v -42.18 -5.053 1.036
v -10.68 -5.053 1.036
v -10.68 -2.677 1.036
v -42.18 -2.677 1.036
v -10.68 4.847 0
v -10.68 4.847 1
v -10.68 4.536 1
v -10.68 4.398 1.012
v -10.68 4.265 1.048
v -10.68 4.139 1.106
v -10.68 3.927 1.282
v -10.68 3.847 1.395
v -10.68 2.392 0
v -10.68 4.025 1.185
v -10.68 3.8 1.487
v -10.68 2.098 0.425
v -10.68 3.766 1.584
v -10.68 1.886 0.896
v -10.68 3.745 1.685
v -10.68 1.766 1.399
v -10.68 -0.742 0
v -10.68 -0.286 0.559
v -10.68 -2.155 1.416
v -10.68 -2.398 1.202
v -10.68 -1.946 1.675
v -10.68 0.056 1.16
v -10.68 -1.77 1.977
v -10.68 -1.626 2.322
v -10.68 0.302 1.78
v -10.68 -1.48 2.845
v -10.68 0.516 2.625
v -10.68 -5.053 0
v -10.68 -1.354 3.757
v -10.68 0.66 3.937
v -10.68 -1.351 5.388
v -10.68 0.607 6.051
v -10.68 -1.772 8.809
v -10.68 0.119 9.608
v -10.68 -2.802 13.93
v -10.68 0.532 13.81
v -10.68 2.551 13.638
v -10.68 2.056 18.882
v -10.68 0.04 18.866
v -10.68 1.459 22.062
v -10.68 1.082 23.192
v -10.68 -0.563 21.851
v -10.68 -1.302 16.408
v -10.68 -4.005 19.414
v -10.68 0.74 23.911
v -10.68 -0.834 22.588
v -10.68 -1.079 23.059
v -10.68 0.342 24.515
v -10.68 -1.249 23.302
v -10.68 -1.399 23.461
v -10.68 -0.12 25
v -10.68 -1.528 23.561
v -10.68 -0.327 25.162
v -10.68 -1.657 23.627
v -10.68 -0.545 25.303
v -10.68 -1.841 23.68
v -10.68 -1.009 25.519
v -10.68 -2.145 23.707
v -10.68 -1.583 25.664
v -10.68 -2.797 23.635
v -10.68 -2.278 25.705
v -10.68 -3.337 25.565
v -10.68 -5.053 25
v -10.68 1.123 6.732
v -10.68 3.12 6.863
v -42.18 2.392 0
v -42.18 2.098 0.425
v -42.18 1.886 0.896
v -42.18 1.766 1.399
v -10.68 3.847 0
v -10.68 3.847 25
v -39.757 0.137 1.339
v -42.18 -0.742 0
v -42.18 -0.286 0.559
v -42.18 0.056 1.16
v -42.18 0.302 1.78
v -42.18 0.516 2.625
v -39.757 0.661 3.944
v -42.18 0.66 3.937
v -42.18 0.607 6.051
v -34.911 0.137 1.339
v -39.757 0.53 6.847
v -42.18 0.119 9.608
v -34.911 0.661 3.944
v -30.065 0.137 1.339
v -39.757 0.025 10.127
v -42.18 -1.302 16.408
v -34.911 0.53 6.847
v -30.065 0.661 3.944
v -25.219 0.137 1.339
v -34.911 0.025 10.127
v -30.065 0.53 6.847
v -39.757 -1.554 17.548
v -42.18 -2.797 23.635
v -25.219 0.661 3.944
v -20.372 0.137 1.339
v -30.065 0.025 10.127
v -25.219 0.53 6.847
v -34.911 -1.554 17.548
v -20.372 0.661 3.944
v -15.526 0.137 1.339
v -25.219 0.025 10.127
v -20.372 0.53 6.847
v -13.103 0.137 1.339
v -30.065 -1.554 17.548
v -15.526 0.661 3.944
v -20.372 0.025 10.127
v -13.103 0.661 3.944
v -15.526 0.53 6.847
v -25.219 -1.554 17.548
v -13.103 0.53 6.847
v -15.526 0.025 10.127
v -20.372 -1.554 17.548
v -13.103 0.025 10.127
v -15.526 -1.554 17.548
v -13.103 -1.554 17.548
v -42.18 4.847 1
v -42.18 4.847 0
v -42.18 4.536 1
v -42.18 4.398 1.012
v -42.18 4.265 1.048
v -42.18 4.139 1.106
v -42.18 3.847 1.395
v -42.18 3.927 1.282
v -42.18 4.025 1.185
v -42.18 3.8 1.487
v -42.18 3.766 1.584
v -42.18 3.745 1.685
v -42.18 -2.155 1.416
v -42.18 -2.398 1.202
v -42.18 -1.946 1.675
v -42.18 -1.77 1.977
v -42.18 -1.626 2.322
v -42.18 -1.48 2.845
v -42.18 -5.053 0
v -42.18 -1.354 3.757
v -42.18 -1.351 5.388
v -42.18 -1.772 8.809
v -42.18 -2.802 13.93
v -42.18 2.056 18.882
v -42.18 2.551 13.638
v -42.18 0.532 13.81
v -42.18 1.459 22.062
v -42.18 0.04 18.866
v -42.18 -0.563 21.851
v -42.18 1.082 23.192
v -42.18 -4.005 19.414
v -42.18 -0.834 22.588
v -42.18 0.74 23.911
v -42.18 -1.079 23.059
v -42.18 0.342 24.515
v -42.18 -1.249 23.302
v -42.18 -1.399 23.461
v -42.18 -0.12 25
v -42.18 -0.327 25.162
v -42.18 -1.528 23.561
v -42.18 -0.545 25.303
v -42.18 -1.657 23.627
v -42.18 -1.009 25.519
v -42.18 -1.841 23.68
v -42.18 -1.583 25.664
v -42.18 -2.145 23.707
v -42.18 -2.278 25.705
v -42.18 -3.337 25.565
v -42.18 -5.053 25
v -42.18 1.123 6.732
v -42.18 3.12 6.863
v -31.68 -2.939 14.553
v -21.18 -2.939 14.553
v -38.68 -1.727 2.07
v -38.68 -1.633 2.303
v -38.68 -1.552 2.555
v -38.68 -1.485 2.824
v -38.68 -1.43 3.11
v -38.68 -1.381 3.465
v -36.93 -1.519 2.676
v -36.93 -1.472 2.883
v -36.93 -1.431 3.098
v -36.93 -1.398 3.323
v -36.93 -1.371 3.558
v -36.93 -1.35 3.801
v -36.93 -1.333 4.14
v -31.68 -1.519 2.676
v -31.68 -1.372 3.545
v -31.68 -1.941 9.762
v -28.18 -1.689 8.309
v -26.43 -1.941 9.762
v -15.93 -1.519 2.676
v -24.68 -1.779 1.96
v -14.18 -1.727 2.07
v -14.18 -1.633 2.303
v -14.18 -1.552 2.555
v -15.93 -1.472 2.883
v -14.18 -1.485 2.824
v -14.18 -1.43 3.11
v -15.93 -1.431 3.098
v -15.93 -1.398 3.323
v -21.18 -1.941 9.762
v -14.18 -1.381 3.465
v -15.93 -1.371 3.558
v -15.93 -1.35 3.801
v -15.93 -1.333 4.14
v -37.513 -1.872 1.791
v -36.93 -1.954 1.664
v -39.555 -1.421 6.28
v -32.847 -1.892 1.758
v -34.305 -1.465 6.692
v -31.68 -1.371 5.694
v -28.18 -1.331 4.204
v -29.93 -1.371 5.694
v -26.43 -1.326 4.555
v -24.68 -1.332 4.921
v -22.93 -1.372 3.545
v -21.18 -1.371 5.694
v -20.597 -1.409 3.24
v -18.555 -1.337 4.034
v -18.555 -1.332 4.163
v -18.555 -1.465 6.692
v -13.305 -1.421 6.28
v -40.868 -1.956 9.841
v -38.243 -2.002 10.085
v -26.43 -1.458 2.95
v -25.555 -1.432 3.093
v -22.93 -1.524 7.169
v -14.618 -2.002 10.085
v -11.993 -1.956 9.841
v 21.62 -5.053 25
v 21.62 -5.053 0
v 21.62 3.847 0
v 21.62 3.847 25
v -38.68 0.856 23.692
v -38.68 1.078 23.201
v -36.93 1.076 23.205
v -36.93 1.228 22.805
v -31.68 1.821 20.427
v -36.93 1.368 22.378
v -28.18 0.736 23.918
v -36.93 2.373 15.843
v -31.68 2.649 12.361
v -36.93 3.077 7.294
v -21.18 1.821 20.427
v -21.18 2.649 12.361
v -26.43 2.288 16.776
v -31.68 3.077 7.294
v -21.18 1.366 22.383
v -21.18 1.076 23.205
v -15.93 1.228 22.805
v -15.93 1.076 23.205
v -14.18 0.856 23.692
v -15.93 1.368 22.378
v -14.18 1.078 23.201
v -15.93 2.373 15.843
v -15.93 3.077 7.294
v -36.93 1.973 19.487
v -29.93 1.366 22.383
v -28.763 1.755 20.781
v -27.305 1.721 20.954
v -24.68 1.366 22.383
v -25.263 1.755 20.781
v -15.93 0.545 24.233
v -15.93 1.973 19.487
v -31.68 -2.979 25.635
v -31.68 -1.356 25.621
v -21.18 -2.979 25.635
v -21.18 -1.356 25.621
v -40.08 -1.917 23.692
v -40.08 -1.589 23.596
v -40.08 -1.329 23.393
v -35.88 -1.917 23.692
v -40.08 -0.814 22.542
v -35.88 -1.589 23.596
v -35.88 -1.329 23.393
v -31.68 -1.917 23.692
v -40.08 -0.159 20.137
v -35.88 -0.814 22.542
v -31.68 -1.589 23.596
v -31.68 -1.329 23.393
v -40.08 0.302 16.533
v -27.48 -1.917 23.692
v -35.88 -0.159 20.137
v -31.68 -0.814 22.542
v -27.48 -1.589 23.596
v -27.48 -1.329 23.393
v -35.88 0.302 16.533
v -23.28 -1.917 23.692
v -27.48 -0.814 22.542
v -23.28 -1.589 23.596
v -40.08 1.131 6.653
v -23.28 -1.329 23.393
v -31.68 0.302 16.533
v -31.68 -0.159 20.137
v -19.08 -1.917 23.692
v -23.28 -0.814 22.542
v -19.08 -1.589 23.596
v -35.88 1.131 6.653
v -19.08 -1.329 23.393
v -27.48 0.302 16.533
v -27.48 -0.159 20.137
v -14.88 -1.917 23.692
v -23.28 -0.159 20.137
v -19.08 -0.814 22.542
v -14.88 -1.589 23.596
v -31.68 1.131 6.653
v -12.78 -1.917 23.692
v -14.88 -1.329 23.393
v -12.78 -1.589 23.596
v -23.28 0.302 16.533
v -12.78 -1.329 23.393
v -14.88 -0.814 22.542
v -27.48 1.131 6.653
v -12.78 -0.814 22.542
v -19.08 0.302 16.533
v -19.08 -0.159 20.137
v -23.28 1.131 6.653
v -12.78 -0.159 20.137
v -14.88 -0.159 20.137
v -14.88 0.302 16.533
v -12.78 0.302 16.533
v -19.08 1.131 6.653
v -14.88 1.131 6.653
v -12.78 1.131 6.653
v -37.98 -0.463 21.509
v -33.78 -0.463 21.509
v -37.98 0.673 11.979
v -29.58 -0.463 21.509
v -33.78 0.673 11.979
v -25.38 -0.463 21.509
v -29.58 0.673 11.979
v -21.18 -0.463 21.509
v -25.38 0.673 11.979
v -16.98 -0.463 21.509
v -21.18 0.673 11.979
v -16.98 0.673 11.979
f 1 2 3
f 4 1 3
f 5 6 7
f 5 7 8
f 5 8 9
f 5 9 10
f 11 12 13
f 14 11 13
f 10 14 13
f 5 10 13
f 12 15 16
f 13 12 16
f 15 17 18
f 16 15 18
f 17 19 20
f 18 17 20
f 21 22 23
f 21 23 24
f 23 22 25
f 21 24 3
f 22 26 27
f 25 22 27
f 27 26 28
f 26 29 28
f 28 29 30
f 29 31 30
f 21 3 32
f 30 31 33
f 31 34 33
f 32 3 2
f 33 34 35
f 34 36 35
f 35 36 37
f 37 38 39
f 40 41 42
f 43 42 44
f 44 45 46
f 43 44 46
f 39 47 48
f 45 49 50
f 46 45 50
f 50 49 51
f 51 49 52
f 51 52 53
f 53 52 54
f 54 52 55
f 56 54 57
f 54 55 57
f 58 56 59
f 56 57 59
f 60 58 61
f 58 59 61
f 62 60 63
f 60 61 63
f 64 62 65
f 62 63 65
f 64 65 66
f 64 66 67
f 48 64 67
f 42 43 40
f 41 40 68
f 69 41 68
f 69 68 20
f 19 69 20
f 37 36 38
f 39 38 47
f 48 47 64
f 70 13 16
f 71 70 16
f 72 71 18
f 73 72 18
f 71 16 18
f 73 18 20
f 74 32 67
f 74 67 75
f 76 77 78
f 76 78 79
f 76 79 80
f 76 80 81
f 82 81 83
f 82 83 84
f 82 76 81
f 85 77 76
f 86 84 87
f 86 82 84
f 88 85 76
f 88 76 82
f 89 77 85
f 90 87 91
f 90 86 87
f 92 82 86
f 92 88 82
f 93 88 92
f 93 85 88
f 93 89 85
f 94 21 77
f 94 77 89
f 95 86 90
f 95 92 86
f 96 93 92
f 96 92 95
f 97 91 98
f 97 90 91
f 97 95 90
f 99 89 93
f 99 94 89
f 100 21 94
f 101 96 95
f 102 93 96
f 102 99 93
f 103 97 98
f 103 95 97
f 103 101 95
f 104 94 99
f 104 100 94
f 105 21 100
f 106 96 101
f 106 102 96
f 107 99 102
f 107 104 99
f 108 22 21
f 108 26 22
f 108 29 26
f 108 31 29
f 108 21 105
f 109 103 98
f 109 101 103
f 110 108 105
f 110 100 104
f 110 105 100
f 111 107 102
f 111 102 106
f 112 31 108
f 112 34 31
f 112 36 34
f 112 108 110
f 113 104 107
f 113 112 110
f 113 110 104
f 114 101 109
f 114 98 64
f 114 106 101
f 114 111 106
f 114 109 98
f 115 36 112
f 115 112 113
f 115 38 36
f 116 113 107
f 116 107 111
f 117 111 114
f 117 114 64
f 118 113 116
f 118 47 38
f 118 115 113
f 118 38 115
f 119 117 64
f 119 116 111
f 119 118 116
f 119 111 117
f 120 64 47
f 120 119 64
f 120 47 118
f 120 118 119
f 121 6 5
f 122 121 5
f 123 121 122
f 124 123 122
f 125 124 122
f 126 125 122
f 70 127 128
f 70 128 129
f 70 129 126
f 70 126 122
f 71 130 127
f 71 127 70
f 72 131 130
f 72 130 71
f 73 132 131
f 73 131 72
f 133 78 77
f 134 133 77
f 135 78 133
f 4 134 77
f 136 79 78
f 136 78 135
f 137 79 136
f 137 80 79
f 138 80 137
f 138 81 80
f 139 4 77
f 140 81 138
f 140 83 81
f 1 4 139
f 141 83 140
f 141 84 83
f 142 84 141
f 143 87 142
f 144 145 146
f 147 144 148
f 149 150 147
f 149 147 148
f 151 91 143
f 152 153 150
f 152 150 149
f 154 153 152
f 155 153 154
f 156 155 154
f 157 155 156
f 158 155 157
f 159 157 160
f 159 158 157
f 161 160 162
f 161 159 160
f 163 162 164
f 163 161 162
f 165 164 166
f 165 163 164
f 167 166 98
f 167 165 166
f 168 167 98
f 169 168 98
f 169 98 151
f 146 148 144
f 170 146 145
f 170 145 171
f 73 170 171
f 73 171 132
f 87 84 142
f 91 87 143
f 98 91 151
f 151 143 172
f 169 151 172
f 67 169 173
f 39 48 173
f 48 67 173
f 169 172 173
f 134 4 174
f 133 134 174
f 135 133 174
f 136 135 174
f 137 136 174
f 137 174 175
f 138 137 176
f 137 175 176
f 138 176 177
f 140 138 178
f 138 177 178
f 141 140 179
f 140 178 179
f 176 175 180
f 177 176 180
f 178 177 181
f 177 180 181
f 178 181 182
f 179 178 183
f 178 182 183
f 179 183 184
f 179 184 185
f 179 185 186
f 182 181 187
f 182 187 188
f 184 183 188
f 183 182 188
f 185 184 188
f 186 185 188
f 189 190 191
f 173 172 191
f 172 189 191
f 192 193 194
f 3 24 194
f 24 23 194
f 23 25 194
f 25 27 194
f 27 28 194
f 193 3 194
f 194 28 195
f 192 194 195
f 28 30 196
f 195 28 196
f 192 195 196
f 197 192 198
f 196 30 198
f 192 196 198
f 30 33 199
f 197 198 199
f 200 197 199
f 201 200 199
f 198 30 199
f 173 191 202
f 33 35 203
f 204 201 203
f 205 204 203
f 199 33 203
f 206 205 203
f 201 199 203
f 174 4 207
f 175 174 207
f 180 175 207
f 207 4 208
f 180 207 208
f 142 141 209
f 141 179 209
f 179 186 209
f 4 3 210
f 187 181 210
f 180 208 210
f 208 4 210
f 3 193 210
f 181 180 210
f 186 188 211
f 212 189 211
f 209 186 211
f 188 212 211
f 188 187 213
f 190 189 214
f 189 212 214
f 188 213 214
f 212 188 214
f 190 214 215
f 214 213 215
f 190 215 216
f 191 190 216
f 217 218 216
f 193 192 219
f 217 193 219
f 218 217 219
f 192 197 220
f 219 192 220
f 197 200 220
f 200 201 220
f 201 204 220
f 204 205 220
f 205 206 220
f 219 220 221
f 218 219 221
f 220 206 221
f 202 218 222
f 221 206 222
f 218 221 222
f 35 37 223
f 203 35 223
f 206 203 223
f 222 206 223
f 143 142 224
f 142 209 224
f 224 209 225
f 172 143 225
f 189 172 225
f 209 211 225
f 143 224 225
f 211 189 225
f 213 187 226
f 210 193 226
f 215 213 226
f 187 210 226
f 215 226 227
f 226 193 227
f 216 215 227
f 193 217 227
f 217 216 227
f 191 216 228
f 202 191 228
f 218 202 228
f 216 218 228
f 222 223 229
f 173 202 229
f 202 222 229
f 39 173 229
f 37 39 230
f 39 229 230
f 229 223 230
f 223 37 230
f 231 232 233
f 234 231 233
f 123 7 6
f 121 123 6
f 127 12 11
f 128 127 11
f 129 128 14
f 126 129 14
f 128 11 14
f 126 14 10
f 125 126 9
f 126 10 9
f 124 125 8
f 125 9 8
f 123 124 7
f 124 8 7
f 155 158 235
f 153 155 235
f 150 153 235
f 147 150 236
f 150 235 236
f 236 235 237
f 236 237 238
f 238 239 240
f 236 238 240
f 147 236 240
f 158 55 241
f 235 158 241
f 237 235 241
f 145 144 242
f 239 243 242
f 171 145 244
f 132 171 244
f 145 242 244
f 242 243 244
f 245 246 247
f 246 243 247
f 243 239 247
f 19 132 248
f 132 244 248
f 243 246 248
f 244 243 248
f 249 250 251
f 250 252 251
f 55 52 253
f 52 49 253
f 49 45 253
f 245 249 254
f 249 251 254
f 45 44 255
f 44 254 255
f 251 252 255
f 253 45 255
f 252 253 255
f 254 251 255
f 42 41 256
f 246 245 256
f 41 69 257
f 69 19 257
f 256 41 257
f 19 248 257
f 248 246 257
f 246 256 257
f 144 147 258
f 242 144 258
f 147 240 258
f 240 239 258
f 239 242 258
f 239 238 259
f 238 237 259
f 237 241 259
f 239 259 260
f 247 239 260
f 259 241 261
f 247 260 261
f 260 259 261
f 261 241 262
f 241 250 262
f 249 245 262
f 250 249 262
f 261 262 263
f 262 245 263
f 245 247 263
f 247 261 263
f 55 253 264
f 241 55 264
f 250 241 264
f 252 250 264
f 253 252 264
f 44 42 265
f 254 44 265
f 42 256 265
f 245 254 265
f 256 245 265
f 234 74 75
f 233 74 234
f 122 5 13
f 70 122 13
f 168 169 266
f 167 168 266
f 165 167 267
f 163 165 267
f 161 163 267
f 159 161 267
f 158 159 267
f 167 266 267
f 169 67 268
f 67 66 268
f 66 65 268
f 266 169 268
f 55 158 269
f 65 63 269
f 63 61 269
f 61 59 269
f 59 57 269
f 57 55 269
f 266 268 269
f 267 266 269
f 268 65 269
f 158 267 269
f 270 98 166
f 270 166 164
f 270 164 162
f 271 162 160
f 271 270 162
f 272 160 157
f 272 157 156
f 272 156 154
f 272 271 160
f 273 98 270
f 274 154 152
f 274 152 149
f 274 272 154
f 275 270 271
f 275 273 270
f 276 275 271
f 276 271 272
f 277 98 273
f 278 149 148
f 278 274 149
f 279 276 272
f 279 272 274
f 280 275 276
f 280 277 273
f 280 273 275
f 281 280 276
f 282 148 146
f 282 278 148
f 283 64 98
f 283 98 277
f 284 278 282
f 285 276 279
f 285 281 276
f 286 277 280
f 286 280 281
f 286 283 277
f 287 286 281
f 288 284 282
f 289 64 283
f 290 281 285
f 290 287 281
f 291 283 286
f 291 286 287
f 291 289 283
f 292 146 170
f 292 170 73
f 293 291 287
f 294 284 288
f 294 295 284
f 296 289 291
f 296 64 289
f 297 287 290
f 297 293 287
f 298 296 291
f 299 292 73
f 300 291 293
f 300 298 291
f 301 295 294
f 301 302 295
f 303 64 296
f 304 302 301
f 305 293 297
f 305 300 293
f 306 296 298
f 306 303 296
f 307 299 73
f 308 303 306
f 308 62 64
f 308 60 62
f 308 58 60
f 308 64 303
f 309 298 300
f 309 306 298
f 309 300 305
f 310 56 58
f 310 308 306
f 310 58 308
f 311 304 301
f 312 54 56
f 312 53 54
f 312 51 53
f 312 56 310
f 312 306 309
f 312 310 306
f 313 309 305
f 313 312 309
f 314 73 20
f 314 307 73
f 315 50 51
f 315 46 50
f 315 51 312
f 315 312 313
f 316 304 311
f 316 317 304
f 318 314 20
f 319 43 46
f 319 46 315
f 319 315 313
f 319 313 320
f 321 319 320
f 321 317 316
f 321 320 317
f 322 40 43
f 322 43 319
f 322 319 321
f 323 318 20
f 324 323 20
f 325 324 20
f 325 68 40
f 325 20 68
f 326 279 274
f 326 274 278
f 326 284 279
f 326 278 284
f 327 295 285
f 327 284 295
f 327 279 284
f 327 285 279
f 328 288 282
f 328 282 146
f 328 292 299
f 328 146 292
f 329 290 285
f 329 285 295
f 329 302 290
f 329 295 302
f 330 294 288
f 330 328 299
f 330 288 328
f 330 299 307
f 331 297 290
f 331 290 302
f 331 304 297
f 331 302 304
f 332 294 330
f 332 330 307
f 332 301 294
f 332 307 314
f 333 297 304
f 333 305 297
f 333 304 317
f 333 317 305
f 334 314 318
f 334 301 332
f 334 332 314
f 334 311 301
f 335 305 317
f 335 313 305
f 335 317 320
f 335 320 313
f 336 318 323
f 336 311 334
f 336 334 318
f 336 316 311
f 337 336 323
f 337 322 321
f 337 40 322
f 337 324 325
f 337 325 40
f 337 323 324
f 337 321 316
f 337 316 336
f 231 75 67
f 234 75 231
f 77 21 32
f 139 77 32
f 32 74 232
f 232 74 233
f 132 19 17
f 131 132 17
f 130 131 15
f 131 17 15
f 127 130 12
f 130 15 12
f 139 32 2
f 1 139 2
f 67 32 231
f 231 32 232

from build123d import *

# Parameters (mm, degrees)
F0_W     = 32.3
F0_H     = 8.9
F1_DEPTH = 25
F3_DEPTH = 31.5


# Not quite as in the source:
# - ends of sketch curves that miss each other by under 0.0002 mm in the source are joined
# - the dataset's text gives a spline's control points without its knots; the knots are read off the source's solid
# - a feature names something its author has since deleted; it is built from what else it names


with BuildPart() as f1:
    # F0 (on Top) → F1 (new body)
    with BuildSketch(Plane.XY):
        with Locations((5.4698575486, -0.6034393178)):
            Rectangle(F0_W, F0_H)
    extrude(amount=F1_DEPTH)


with BuildPart() as f3:
    # F2 (on face) → F3 (new body)
    with BuildSketch(Plane(origin=(-10.6801424514, 0, 0), x_dir=(0, -1, 0), z_dir=(-1, 0, 0))):
        with BuildLine():
            Line((5.0534393178, 1.0357304234), (2.6771188714, 1.0357304234))
            add(Edge.make_bspline(
                [(2.6771188714, 1.0357304234), (-0.8418467478, 2.7226619422), (3.4419558942, 14.6298892796), (5.0534393178, 25)],
                knots=[0, 0, 0, 0, 24.0818004976, 24.0818004976, 24.0818004976, 24.0818004976], degree=3))
            Line((5.0534393178, 25), (0.119884152, 25))
            add(Edge.make_bspline(
                [(0.119884152, 25), (-2.8379753894, 22.4677441836), (-2.0553450015, 13.3724585221), (-3.745077647, 1.6851037906)],
                knots=[6.6765126495, 6.6765126495, 6.6765126495, 6.6765126495, 25.2359659061, 25.2359659061, 25.2359659061, 25.2359659061], degree=3))
            add(Edge.make_bspline(
                [(-3.745077647, 1.6851037906), (-3.7779541339, 1.4577073649), (-3.8117665587, 1.2293296854), (-3.8465606822, 1)],
                knots=[25.2359659061, 25.2359659061, 25.2359659061, 25.2359659061, 25.5970701448, 25.5970701448, 25.5970701448, 25.5970701448], degree=3))
            Line((-3.8465606822, 1), (-3.8465606822, 0))
            Line((-3.8465606822, 0), (-2.3918252697, 0))
            ThreePointArc((-2.3918252697, 0), (-1.9811428085, 0.6557758803), (-1.7656583318, 1.3989235973))
            add(Edge.make_bspline(
                [(2.7973249591, 23.6349495832), (2.5542065536, 23.6832426766), (2.2182902844, 23.7171528416), (1.9025294377, 23.6958260622), (1.7187571468, 23.6535525287), (1.5872796632, 23.5988992548), (1.4682334776, 23.5245471174), (1.3331956369, 23.4054124572), (1.1209928945, 23.151165617), (0.8119295886, 22.6057356225), (0.4543623636, 21.5660702122), (0.1494819685, 20.186926591), (-0.0998810713, 18.5107135491), (-0.3750402406, 15.9253364577), (-0.6586936544, 12.1065119049), (-1.0683221986, 6.9581823178), (-1.5020900663, 3.2219080247), (-1.7656583318, 1.3989235973)],
                knots=[0.0771936817, 0.0771936817, 0.0771936817, 0.0771936817, 0.125, 0.15625, 0.1875, 0.21875, 0.25, 0.28125, 0.3125, 0.375, 0.4375, 0.5, 0.5625, 0.625, 0.75, 0.875, 0.9858927937, 0.9858927937, 0.9858927937, 0.9858927937], degree=3))
            add(Edge.make_bspline(
                [(0.742053504, 4.49535e-05), (0.6962561573, 0.0468160151), (0.4830601411, 0.2758284647), (0.1608813084, 0.7184982614), (-0.2560654542, 1.5434831509), (-0.5501272315, 2.6072939003), (-0.6855239109, 3.9304992744), (-0.6722493573, 5.3334435146), (-0.5451945541, 6.8309904438), (-0.3267180535, 8.4260370504), (0.062759398, 10.6753803152), (0.6932496185, 13.6928806547), (1.5567086755, 17.5335150811), (2.2817575639, 20.8892385574), (2.6687374058, 22.9139279094), (2.7973249591, 23.6349495832)],
                knots=[0.0542797466, 0.0542797466, 0.0542797466, 0.0542797466, 0.0625, 0.09375, 0.125, 0.1875, 0.25, 0.3125, 0.375, 0.4375, 0.5, 0.625, 0.75, 0.875, 0.9452188411, 0.9452188411, 0.9452188411, 0.9452188411], degree=3))
            Line((0.742053504, 4.49535e-05), (5.0534393178, 0))
            Line((5.0534393178, 0), (5.0534393178, 1.0357304234))
        make_face()
        with BuildLine():
            Line((0.119884152, 25), (5.0534393178, 25))
            add(Edge.make_bspline(
                [(5.0534393178, 25), (2.732042289, 25.9725657014), (1.1839341739, 25.9109448299), (0.119884152, 25)],
                knots=[0, 0, 0, 0, 6.6765126495, 6.6765126495, 6.6765126495, 6.6765126495], degree=3))
        make_face()
        with BuildLine():
            add(Edge.make_bspline(
                [(-3.745077647, 1.6851037906), (-3.7779541339, 1.4577073649), (-3.8117665587, 1.2293296854), (-3.8465606822, 1)],
                knots=[25.2359659061, 25.2359659061, 25.2359659061, 25.2359659061, 25.5970701448, 25.5970701448, 25.5970701448, 25.5970701448], degree=3))
            ThreePointArc((-3.745077647, 1.6851037906), (-3.7817745844, 1.5352780015), (-3.8465606822, 1.3952880238))
            Line((-3.8465606822, 1.3952880238), (-3.8465606822, 1))
        make_face()
        with BuildLine():
            Line((-3.8465606822, 0), (-3.8465606822, 1))
            Line((-3.8465606822, 1), (-3.8465606822, 1.3952880238))
            ThreePointArc((-3.8465606822, 1.3952880238), (-4.1388415136, 1.105825773), (-4.5363555194, 1))
            Line((-4.5363555194, 1), (-4.8465606822, 1))
            Line((-4.8465606822, 1), (-4.8465606822, 0))
            Line((-4.8465606822, 0), (-3.8465606822, 0))
        make_face()
    extrude(amount=F3_DEPTH)


solid = Compound([f1.part, f3.part])
